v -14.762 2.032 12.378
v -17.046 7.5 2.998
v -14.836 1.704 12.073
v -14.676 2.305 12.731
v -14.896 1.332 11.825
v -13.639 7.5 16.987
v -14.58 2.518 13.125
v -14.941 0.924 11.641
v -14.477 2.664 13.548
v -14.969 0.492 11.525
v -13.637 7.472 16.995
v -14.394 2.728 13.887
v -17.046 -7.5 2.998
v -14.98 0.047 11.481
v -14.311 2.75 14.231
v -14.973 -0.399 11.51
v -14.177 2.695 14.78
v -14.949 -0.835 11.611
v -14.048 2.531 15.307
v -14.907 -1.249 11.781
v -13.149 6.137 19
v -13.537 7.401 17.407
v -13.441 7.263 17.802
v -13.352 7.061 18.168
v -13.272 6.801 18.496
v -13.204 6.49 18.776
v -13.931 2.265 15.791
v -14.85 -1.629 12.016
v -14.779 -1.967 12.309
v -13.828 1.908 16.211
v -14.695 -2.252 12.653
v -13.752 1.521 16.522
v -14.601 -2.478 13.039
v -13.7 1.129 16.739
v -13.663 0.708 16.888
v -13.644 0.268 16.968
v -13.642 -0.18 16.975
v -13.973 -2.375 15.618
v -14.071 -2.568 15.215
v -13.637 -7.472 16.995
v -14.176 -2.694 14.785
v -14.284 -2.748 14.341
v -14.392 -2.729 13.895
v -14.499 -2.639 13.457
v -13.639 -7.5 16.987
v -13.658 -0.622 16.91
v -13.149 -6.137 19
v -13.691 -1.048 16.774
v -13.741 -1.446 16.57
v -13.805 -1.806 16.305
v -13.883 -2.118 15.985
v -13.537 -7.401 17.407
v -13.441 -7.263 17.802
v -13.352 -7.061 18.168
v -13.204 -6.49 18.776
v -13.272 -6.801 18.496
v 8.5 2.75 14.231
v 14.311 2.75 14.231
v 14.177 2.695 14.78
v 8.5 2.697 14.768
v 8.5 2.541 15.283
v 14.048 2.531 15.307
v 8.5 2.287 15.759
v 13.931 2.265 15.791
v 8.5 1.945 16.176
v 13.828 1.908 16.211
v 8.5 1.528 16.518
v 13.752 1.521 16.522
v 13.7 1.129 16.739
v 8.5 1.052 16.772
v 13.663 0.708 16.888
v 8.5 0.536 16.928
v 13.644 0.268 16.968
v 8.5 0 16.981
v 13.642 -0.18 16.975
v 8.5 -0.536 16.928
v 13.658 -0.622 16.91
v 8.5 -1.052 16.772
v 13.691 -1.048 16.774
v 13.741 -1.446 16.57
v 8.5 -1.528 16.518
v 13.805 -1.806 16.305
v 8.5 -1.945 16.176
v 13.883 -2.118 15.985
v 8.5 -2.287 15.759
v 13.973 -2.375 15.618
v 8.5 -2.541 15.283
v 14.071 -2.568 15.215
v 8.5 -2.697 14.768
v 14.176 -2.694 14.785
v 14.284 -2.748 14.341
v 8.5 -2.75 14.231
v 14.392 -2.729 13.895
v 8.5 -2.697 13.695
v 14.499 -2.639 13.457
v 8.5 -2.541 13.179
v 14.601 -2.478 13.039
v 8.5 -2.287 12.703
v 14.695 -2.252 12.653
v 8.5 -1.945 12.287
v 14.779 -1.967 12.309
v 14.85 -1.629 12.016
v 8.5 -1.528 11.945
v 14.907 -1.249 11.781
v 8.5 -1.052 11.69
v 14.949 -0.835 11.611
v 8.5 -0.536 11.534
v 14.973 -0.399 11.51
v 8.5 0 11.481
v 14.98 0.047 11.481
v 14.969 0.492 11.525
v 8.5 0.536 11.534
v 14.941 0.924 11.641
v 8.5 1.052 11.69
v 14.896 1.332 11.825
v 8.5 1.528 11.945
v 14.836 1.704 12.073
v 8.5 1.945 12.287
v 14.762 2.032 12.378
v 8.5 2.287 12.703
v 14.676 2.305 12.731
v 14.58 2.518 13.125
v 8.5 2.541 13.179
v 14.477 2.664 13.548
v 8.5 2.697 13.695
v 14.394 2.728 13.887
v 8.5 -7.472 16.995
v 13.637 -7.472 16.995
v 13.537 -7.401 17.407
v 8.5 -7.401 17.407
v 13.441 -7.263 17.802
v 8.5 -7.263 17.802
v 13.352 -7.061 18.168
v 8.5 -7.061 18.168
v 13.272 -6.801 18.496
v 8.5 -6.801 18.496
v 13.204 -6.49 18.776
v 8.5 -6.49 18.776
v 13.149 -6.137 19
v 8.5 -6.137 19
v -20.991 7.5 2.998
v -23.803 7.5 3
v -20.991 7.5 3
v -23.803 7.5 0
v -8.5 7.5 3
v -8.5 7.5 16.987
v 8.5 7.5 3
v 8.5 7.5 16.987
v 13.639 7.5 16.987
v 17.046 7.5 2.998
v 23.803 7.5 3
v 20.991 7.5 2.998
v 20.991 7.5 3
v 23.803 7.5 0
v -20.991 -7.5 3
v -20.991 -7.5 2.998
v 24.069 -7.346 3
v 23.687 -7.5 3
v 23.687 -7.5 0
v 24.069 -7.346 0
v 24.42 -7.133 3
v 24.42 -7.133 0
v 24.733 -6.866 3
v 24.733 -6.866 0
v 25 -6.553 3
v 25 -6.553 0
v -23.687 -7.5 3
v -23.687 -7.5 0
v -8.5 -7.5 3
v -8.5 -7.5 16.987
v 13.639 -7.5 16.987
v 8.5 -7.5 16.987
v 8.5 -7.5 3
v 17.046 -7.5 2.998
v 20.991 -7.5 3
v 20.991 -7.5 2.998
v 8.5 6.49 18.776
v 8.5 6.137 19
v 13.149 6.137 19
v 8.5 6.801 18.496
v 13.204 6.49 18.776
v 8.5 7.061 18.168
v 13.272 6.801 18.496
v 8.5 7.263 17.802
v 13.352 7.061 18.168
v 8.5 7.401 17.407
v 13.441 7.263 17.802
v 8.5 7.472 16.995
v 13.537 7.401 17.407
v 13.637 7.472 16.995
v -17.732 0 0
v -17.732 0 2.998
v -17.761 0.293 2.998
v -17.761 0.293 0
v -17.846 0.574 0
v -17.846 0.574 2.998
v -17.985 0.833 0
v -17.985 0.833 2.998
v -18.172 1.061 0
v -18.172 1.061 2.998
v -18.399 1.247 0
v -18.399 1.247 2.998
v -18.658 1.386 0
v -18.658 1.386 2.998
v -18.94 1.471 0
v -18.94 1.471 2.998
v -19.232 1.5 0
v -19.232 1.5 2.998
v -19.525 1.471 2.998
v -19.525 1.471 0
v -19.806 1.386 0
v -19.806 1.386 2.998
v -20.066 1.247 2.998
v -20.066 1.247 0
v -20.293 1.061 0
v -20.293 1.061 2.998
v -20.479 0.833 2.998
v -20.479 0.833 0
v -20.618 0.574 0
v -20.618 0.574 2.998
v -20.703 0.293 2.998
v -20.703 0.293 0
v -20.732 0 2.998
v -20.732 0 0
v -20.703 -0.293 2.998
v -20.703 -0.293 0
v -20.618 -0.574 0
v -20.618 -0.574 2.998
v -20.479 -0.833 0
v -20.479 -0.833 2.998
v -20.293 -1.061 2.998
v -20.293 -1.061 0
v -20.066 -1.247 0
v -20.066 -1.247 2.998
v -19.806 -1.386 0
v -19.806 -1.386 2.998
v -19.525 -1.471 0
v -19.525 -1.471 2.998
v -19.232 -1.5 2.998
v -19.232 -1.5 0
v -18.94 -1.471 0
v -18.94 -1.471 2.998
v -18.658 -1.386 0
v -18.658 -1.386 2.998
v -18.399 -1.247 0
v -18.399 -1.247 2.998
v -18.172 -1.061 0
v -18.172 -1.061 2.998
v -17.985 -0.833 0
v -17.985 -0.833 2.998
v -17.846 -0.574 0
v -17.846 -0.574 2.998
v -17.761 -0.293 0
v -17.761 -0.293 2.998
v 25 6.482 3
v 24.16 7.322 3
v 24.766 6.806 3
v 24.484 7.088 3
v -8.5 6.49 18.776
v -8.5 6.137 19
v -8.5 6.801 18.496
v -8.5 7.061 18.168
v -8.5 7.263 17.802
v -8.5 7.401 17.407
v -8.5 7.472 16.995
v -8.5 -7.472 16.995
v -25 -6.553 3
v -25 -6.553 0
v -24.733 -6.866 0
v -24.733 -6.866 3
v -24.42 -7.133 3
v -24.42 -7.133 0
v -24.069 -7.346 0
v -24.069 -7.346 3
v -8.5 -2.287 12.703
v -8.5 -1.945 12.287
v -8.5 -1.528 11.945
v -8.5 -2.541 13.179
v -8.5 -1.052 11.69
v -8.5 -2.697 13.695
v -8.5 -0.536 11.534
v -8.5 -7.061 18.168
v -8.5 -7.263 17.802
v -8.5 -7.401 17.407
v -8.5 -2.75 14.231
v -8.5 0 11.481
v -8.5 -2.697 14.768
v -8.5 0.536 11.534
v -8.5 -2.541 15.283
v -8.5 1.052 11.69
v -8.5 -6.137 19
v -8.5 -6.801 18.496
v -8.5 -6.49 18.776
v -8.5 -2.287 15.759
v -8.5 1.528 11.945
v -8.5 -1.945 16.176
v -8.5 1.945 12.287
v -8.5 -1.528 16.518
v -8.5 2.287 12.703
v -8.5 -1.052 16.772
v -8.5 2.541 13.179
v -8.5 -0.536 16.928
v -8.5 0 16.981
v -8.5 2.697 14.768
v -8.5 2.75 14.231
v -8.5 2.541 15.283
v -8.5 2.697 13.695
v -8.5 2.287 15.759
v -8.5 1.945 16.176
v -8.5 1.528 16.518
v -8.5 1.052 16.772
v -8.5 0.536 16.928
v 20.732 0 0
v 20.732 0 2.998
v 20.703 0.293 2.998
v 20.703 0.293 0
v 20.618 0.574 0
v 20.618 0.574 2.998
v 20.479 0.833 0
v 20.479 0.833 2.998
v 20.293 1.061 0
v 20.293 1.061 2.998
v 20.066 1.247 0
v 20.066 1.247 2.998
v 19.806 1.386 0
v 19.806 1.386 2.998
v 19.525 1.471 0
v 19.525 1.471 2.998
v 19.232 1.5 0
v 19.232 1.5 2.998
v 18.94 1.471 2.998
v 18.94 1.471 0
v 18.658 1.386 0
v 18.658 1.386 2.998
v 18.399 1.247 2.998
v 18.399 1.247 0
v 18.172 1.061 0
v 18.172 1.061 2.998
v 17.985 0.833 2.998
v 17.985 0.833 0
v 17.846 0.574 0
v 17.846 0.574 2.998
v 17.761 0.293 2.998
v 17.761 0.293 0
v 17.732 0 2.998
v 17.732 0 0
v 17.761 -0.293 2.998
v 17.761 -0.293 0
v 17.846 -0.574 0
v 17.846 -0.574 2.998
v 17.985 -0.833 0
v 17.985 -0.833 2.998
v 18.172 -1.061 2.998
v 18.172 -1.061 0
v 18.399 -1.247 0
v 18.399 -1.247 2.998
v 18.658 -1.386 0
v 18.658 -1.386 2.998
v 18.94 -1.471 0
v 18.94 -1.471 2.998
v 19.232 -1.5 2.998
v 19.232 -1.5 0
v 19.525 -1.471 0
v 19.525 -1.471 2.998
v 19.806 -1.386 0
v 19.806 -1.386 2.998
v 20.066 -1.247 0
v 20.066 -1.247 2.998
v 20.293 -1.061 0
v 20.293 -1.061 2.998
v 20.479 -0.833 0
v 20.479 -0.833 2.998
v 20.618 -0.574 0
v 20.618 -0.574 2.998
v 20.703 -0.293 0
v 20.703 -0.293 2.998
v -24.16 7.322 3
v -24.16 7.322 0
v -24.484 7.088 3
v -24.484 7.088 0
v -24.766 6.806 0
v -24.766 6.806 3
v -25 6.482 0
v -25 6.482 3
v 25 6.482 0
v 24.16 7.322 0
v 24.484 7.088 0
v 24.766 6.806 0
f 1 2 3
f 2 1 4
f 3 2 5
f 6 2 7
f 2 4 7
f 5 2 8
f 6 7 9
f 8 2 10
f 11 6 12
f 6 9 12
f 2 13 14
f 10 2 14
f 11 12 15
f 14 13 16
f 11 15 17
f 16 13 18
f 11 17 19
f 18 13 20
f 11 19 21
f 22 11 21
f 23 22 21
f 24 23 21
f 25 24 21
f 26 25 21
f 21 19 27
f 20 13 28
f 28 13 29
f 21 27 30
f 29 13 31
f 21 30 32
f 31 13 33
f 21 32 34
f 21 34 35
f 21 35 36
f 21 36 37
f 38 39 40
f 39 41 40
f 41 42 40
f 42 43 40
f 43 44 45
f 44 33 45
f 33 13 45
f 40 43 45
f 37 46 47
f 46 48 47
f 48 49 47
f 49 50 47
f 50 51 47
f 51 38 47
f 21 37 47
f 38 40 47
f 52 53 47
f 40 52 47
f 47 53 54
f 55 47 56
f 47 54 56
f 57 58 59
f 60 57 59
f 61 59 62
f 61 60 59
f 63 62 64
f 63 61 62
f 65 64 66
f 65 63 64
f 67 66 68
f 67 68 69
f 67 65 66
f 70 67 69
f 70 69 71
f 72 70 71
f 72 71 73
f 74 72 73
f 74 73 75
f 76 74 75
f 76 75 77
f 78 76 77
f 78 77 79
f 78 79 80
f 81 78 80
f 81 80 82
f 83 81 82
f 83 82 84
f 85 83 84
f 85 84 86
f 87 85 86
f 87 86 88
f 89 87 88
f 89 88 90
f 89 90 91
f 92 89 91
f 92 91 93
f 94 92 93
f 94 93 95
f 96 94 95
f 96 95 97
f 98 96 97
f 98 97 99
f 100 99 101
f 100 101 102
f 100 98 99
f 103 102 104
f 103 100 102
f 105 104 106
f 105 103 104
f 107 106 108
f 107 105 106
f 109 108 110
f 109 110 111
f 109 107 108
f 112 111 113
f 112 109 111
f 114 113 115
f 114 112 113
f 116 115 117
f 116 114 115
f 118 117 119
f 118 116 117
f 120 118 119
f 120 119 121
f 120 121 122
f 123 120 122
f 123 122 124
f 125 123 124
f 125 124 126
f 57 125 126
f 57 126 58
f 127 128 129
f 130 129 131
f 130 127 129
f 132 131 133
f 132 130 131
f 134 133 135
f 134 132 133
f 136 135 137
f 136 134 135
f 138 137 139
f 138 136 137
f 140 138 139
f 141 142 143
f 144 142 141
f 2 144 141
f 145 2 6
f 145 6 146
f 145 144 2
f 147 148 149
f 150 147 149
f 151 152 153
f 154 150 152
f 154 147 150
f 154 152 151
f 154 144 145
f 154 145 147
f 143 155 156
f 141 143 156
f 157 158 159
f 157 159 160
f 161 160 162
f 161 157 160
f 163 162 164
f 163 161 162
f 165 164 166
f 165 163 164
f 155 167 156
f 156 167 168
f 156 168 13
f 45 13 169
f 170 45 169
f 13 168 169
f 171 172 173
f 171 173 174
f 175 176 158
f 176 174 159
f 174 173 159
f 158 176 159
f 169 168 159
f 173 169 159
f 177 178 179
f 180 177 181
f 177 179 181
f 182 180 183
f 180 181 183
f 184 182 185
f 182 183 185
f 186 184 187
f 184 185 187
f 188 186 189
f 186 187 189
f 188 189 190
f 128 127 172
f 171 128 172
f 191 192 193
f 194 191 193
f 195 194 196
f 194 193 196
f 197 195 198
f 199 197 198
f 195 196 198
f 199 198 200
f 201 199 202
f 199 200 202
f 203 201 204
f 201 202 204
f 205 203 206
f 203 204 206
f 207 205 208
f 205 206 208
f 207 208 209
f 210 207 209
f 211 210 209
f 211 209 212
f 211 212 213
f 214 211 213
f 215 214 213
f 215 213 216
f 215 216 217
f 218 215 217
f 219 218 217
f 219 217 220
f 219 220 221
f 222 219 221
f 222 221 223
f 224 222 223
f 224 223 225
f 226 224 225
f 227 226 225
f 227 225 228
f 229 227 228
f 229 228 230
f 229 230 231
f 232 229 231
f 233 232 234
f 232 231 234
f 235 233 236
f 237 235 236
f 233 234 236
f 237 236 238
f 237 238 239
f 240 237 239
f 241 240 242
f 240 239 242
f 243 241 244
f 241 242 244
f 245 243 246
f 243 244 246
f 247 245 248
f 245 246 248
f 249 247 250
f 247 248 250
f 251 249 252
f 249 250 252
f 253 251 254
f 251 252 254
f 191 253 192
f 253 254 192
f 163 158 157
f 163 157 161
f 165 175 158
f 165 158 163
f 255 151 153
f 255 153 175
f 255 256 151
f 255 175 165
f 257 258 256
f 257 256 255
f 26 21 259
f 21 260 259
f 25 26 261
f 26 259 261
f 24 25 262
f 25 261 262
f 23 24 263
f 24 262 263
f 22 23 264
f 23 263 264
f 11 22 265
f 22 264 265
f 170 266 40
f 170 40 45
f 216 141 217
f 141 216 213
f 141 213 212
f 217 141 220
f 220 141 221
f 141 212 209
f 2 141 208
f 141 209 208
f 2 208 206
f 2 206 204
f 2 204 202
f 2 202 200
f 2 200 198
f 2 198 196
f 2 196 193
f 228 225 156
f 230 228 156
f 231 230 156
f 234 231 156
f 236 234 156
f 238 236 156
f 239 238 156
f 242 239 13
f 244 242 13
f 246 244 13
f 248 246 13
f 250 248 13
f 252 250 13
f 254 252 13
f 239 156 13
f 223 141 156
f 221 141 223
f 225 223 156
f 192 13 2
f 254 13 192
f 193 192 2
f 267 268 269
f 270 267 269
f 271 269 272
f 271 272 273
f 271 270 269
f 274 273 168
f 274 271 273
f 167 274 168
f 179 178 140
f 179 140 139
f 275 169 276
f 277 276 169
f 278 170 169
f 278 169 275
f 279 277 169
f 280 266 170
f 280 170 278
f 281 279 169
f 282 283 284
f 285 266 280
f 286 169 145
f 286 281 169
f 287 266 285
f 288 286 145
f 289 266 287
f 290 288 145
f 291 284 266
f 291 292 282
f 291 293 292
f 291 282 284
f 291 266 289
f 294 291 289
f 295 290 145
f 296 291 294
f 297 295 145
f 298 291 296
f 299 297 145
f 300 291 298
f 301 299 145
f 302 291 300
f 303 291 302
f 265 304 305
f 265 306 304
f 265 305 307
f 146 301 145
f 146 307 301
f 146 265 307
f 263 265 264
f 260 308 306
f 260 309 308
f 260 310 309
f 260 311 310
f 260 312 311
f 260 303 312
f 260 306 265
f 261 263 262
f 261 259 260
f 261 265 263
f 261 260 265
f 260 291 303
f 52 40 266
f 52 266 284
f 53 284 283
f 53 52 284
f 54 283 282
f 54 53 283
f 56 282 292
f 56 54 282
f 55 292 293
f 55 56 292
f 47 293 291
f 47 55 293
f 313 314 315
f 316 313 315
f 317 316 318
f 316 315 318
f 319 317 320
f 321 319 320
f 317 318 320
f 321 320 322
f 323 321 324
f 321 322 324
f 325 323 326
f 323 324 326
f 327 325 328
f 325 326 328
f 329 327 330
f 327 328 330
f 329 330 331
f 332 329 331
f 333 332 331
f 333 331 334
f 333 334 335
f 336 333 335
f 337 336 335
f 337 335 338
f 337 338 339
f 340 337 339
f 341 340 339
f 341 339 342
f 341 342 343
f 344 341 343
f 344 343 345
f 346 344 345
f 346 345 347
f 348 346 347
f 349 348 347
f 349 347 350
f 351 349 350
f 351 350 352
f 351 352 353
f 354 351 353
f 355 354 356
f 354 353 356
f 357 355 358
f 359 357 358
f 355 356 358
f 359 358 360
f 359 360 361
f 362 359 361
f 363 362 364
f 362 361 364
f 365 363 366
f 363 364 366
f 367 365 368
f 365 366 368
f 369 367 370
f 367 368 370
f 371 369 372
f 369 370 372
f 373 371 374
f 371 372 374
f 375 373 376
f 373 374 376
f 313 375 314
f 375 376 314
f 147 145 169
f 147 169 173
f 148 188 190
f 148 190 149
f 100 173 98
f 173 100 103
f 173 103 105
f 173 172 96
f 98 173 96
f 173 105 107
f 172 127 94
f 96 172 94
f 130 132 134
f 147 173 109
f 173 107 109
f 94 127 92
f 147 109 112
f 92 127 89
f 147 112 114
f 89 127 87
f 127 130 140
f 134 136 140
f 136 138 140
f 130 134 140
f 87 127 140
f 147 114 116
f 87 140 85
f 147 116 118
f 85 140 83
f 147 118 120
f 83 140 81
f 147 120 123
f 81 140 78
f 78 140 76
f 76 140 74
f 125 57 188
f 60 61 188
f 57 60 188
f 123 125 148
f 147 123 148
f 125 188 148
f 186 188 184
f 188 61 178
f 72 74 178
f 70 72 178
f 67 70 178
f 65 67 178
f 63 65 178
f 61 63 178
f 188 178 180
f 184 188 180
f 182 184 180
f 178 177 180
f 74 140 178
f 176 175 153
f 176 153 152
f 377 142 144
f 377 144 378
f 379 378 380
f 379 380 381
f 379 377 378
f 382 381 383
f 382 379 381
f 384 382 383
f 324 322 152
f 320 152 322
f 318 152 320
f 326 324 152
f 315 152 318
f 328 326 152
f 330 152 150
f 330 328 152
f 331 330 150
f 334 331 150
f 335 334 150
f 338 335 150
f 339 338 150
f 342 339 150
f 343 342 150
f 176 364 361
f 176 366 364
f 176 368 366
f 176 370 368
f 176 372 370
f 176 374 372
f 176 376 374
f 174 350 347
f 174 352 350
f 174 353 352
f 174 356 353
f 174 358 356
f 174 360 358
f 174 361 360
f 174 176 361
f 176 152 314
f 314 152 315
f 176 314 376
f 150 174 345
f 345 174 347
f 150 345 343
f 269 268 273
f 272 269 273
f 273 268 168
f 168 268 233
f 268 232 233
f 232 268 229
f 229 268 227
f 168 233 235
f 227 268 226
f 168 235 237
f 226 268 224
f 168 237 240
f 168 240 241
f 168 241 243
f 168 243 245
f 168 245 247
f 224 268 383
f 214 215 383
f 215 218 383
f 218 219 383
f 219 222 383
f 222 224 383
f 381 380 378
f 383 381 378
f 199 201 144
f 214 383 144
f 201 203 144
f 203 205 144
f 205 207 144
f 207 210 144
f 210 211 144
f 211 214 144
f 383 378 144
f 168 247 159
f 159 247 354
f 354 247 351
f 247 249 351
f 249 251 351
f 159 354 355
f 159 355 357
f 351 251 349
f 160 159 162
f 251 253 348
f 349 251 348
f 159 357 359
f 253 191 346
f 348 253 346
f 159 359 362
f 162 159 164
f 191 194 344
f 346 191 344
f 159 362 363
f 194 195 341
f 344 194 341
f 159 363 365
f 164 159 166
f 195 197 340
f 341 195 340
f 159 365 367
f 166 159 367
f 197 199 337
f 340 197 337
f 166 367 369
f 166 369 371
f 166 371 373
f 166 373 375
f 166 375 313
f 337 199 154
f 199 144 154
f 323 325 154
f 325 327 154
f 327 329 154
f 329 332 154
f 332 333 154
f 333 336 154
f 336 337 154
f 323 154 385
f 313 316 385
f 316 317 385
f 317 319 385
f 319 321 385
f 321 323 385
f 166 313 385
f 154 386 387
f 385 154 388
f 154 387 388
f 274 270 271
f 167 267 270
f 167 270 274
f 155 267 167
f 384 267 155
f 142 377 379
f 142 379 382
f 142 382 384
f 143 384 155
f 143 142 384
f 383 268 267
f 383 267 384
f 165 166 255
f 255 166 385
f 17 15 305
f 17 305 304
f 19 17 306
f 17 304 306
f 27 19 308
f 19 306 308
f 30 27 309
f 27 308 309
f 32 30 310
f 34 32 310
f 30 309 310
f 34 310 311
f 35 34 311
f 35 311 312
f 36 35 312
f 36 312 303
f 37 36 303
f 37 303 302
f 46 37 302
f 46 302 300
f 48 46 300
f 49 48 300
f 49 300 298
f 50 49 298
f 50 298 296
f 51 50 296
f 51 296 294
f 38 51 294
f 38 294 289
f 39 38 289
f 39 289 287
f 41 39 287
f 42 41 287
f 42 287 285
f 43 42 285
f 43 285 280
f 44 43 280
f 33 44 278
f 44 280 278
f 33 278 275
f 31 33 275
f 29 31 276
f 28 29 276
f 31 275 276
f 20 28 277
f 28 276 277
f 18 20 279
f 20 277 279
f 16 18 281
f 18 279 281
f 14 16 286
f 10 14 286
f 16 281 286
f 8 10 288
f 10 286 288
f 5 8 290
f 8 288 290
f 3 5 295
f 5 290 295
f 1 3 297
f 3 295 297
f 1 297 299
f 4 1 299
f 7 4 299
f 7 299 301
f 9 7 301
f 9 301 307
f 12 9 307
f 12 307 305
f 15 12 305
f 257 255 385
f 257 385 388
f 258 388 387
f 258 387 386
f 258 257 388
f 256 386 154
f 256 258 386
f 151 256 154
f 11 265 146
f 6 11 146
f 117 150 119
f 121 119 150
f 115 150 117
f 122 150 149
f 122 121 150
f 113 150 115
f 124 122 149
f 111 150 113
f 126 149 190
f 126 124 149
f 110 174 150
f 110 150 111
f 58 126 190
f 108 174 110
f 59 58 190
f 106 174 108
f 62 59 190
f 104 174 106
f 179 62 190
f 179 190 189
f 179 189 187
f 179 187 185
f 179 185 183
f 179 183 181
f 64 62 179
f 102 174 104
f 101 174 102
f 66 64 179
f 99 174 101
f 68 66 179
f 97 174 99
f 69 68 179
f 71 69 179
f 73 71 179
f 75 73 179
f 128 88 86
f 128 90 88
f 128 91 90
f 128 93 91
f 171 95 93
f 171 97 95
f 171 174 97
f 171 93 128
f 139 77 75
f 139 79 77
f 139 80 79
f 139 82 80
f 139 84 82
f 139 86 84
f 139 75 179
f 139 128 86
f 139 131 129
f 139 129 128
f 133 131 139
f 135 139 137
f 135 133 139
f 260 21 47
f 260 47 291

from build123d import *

# Parameters (mm, degrees)
SKETCH_W        = 50
SKETCH_H        = 15
PAD_DEPTH       = 3
SKETCH001_W     = 40
SKETCH001_H     = 15
PAD001_DEPTH    = 16
POCKET_DEPTH    = 30
SKETCH011_W     = 17
SKETCH011_H     = 15
POCKET001_DEPTH = 16
SKETCH004_R     = 2.75
HOLE_DEPTH      = 25
HOLE001_DEPTH   = 25
HOLE001_TIPS_R  = 2.75
POCKET002_DEPTH = 35
POCKET003_DEPTH = 5
SKETCH007_R     = 1.5
POCKET004_DEPTH = 10


with BuildPart() as part:
    # Sketch → Pad (new body)
    with BuildSketch(Plane.XY):
        Rectangle(SKETCH_W, SKETCH_H)
    extrude(amount=PAD_DEPTH)

    # Sketch001 (on Face6 of Pad) → Pad001 (join)
    with BuildSketch(Plane.XY.offset(3)):
        Rectangle(SKETCH001_W, SKETCH001_H)
    extrude(amount=PAD001_DEPTH)

    # Sketch002 (on Face9 of Pad001) → Pocket (cut)
    with BuildSketch(Plane.XZ.offset(7.5)):
        Polygon((-17.046261, 2.99842), (-13.147281, 19.007174), (-20.991112, 19.328264), (-20.991112, 2.99842), align=None)
        Polygon((17.046261, 2.99842), (13.147281, 19.007174), (20.991112, 19.328264), (20.991112, 2.99842), align=None)
    extrude(amount=-POCKET_DEPTH, mode=Mode.SUBTRACT)

    # Sketch011 (on Face11 of Pocket) → Pocket001 (cut)
    with BuildSketch(Plane.XY.offset(19)):
        Rectangle(SKETCH011_W, SKETCH011_H)
    extrude(amount=-POCKET001_DEPTH, mode=Mode.SUBTRACT)

    # Sketch004 → Hole (cut)
    with BuildSketch(Plane.YZ.offset(-8.5)):
        with Locations((0, 14.231076)):
            Circle(SKETCH004_R)
    extrude(amount=-HOLE_DEPTH, mode=Mode.SUBTRACT)

    # Sketch004 → Hole001 (cut)
    with BuildSketch(Plane.YZ.offset(-8.5)):
        with Locations((0, 14.231076)):
            Circle(SKETCH004_R)
    extrude(amount=HOLE001_DEPTH, mode=Mode.SUBTRACT)

    # Hole001 tips → Hole001 tip 1 section 0
    with BuildSketch(Plane.YZ.offset(16.5), mode=Mode.PRIVATE) as hole001_tip_1_s0:
        with Locations((0, 14.231076)):
            Circle(HOLE001_TIPS_R)
    loft([hole001_tip_1_s0.sketch, Vertex(18.152367, 0, 14.231076)], mode=Mode.SUBTRACT)

    # Sketch005 → Pocket002 (cut, symmetric)
    with BuildSketch(Plane(origin=(8.5, 0, 0), x_dir=(0, -1, 0), z_dir=(-1, 0, 0))):
        with BuildLine():
            ThreePointArc((-5.391307, 19.250991), (-6.817122, 18.478375), (-7.471648, 16.994637))
            Line((-7.471648, 16.994637), (-7.674281, 16.939731))
            Line((-7.674281, 16.939731), (-7.674281, 19.250991))
            Line((-5.391307, 19.250991), (-7.674281, 19.250991))
        make_face()
        with BuildLine():
            ThreePointArc((7.47165, 16.994637), (6.817123, 18.478376), (5.391307, 19.250992))
            Line((5.391307, 19.250992), (7.674281, 19.250992))
            Line((7.674281, 16.939731), (7.674281, 19.250992))
            Line((7.47165, 16.994637), (7.674281, 16.939731))
        make_face()
    extrude(amount=POCKET002_DEPTH, both=True, mode=Mode.SUBTRACT)

    # Sketch006 → Pocket003 (cut)
    with BuildSketch(Plane.XY.offset(3)):
        with BuildLine():
            ThreePointArc((-23.120269, 7.667623), (-24.453663, 7.11346), (-25.253739, 5.911415))
            Line((-25.253739, 5.911415), (-25.253739, 7.71409))
            Line((-25.253739, 7.71409), (-23.120269, 7.667623))
        make_face()
        with BuildLine():
            ThreePointArc((-25.38047, -5.775698), (-24.586864, -7.001599), (-23.25292, -7.595938))
            Line((-25.38047, -7.584312), (-23.25292, -7.595938))
            Line((-25.38047, -5.775698), (-25.38047, -7.584312))
        make_face()
        with BuildLine():
            ThreePointArc((25.253739, 5.911415), (24.453663, 7.113459), (23.12027, 7.667622))
            Line((25.253739, 7.71409), (23.12027, 7.667622))
            Line((25.253739, 5.911415), (25.253739, 7.71409))
        make_face()
        with BuildLine():
            ThreePointArc((23.25292, -7.595938), (24.586863, -7.001599), (25.380469, -5.775699))
            Line((25.380469, -5.775699), (25.380469, -7.584312))
            Line((25.380469, -7.584312), (23.25292, -7.595938))
        make_face()
    extrude(amount=-POCKET003_DEPTH, mode=Mode.SUBTRACT)

    # Sketch007 → Pocket004 (cut)
    with BuildSketch(Plane.XY.offset(3)):
        with Locations((-19.232222, 0)):
            Circle(SKETCH007_R)
        with Locations((19.232222, 0)):
            Circle(SKETCH007_R)
    extrude(amount=-POCKET004_DEPTH, mode=Mode.SUBTRACT)


solid = part.part
